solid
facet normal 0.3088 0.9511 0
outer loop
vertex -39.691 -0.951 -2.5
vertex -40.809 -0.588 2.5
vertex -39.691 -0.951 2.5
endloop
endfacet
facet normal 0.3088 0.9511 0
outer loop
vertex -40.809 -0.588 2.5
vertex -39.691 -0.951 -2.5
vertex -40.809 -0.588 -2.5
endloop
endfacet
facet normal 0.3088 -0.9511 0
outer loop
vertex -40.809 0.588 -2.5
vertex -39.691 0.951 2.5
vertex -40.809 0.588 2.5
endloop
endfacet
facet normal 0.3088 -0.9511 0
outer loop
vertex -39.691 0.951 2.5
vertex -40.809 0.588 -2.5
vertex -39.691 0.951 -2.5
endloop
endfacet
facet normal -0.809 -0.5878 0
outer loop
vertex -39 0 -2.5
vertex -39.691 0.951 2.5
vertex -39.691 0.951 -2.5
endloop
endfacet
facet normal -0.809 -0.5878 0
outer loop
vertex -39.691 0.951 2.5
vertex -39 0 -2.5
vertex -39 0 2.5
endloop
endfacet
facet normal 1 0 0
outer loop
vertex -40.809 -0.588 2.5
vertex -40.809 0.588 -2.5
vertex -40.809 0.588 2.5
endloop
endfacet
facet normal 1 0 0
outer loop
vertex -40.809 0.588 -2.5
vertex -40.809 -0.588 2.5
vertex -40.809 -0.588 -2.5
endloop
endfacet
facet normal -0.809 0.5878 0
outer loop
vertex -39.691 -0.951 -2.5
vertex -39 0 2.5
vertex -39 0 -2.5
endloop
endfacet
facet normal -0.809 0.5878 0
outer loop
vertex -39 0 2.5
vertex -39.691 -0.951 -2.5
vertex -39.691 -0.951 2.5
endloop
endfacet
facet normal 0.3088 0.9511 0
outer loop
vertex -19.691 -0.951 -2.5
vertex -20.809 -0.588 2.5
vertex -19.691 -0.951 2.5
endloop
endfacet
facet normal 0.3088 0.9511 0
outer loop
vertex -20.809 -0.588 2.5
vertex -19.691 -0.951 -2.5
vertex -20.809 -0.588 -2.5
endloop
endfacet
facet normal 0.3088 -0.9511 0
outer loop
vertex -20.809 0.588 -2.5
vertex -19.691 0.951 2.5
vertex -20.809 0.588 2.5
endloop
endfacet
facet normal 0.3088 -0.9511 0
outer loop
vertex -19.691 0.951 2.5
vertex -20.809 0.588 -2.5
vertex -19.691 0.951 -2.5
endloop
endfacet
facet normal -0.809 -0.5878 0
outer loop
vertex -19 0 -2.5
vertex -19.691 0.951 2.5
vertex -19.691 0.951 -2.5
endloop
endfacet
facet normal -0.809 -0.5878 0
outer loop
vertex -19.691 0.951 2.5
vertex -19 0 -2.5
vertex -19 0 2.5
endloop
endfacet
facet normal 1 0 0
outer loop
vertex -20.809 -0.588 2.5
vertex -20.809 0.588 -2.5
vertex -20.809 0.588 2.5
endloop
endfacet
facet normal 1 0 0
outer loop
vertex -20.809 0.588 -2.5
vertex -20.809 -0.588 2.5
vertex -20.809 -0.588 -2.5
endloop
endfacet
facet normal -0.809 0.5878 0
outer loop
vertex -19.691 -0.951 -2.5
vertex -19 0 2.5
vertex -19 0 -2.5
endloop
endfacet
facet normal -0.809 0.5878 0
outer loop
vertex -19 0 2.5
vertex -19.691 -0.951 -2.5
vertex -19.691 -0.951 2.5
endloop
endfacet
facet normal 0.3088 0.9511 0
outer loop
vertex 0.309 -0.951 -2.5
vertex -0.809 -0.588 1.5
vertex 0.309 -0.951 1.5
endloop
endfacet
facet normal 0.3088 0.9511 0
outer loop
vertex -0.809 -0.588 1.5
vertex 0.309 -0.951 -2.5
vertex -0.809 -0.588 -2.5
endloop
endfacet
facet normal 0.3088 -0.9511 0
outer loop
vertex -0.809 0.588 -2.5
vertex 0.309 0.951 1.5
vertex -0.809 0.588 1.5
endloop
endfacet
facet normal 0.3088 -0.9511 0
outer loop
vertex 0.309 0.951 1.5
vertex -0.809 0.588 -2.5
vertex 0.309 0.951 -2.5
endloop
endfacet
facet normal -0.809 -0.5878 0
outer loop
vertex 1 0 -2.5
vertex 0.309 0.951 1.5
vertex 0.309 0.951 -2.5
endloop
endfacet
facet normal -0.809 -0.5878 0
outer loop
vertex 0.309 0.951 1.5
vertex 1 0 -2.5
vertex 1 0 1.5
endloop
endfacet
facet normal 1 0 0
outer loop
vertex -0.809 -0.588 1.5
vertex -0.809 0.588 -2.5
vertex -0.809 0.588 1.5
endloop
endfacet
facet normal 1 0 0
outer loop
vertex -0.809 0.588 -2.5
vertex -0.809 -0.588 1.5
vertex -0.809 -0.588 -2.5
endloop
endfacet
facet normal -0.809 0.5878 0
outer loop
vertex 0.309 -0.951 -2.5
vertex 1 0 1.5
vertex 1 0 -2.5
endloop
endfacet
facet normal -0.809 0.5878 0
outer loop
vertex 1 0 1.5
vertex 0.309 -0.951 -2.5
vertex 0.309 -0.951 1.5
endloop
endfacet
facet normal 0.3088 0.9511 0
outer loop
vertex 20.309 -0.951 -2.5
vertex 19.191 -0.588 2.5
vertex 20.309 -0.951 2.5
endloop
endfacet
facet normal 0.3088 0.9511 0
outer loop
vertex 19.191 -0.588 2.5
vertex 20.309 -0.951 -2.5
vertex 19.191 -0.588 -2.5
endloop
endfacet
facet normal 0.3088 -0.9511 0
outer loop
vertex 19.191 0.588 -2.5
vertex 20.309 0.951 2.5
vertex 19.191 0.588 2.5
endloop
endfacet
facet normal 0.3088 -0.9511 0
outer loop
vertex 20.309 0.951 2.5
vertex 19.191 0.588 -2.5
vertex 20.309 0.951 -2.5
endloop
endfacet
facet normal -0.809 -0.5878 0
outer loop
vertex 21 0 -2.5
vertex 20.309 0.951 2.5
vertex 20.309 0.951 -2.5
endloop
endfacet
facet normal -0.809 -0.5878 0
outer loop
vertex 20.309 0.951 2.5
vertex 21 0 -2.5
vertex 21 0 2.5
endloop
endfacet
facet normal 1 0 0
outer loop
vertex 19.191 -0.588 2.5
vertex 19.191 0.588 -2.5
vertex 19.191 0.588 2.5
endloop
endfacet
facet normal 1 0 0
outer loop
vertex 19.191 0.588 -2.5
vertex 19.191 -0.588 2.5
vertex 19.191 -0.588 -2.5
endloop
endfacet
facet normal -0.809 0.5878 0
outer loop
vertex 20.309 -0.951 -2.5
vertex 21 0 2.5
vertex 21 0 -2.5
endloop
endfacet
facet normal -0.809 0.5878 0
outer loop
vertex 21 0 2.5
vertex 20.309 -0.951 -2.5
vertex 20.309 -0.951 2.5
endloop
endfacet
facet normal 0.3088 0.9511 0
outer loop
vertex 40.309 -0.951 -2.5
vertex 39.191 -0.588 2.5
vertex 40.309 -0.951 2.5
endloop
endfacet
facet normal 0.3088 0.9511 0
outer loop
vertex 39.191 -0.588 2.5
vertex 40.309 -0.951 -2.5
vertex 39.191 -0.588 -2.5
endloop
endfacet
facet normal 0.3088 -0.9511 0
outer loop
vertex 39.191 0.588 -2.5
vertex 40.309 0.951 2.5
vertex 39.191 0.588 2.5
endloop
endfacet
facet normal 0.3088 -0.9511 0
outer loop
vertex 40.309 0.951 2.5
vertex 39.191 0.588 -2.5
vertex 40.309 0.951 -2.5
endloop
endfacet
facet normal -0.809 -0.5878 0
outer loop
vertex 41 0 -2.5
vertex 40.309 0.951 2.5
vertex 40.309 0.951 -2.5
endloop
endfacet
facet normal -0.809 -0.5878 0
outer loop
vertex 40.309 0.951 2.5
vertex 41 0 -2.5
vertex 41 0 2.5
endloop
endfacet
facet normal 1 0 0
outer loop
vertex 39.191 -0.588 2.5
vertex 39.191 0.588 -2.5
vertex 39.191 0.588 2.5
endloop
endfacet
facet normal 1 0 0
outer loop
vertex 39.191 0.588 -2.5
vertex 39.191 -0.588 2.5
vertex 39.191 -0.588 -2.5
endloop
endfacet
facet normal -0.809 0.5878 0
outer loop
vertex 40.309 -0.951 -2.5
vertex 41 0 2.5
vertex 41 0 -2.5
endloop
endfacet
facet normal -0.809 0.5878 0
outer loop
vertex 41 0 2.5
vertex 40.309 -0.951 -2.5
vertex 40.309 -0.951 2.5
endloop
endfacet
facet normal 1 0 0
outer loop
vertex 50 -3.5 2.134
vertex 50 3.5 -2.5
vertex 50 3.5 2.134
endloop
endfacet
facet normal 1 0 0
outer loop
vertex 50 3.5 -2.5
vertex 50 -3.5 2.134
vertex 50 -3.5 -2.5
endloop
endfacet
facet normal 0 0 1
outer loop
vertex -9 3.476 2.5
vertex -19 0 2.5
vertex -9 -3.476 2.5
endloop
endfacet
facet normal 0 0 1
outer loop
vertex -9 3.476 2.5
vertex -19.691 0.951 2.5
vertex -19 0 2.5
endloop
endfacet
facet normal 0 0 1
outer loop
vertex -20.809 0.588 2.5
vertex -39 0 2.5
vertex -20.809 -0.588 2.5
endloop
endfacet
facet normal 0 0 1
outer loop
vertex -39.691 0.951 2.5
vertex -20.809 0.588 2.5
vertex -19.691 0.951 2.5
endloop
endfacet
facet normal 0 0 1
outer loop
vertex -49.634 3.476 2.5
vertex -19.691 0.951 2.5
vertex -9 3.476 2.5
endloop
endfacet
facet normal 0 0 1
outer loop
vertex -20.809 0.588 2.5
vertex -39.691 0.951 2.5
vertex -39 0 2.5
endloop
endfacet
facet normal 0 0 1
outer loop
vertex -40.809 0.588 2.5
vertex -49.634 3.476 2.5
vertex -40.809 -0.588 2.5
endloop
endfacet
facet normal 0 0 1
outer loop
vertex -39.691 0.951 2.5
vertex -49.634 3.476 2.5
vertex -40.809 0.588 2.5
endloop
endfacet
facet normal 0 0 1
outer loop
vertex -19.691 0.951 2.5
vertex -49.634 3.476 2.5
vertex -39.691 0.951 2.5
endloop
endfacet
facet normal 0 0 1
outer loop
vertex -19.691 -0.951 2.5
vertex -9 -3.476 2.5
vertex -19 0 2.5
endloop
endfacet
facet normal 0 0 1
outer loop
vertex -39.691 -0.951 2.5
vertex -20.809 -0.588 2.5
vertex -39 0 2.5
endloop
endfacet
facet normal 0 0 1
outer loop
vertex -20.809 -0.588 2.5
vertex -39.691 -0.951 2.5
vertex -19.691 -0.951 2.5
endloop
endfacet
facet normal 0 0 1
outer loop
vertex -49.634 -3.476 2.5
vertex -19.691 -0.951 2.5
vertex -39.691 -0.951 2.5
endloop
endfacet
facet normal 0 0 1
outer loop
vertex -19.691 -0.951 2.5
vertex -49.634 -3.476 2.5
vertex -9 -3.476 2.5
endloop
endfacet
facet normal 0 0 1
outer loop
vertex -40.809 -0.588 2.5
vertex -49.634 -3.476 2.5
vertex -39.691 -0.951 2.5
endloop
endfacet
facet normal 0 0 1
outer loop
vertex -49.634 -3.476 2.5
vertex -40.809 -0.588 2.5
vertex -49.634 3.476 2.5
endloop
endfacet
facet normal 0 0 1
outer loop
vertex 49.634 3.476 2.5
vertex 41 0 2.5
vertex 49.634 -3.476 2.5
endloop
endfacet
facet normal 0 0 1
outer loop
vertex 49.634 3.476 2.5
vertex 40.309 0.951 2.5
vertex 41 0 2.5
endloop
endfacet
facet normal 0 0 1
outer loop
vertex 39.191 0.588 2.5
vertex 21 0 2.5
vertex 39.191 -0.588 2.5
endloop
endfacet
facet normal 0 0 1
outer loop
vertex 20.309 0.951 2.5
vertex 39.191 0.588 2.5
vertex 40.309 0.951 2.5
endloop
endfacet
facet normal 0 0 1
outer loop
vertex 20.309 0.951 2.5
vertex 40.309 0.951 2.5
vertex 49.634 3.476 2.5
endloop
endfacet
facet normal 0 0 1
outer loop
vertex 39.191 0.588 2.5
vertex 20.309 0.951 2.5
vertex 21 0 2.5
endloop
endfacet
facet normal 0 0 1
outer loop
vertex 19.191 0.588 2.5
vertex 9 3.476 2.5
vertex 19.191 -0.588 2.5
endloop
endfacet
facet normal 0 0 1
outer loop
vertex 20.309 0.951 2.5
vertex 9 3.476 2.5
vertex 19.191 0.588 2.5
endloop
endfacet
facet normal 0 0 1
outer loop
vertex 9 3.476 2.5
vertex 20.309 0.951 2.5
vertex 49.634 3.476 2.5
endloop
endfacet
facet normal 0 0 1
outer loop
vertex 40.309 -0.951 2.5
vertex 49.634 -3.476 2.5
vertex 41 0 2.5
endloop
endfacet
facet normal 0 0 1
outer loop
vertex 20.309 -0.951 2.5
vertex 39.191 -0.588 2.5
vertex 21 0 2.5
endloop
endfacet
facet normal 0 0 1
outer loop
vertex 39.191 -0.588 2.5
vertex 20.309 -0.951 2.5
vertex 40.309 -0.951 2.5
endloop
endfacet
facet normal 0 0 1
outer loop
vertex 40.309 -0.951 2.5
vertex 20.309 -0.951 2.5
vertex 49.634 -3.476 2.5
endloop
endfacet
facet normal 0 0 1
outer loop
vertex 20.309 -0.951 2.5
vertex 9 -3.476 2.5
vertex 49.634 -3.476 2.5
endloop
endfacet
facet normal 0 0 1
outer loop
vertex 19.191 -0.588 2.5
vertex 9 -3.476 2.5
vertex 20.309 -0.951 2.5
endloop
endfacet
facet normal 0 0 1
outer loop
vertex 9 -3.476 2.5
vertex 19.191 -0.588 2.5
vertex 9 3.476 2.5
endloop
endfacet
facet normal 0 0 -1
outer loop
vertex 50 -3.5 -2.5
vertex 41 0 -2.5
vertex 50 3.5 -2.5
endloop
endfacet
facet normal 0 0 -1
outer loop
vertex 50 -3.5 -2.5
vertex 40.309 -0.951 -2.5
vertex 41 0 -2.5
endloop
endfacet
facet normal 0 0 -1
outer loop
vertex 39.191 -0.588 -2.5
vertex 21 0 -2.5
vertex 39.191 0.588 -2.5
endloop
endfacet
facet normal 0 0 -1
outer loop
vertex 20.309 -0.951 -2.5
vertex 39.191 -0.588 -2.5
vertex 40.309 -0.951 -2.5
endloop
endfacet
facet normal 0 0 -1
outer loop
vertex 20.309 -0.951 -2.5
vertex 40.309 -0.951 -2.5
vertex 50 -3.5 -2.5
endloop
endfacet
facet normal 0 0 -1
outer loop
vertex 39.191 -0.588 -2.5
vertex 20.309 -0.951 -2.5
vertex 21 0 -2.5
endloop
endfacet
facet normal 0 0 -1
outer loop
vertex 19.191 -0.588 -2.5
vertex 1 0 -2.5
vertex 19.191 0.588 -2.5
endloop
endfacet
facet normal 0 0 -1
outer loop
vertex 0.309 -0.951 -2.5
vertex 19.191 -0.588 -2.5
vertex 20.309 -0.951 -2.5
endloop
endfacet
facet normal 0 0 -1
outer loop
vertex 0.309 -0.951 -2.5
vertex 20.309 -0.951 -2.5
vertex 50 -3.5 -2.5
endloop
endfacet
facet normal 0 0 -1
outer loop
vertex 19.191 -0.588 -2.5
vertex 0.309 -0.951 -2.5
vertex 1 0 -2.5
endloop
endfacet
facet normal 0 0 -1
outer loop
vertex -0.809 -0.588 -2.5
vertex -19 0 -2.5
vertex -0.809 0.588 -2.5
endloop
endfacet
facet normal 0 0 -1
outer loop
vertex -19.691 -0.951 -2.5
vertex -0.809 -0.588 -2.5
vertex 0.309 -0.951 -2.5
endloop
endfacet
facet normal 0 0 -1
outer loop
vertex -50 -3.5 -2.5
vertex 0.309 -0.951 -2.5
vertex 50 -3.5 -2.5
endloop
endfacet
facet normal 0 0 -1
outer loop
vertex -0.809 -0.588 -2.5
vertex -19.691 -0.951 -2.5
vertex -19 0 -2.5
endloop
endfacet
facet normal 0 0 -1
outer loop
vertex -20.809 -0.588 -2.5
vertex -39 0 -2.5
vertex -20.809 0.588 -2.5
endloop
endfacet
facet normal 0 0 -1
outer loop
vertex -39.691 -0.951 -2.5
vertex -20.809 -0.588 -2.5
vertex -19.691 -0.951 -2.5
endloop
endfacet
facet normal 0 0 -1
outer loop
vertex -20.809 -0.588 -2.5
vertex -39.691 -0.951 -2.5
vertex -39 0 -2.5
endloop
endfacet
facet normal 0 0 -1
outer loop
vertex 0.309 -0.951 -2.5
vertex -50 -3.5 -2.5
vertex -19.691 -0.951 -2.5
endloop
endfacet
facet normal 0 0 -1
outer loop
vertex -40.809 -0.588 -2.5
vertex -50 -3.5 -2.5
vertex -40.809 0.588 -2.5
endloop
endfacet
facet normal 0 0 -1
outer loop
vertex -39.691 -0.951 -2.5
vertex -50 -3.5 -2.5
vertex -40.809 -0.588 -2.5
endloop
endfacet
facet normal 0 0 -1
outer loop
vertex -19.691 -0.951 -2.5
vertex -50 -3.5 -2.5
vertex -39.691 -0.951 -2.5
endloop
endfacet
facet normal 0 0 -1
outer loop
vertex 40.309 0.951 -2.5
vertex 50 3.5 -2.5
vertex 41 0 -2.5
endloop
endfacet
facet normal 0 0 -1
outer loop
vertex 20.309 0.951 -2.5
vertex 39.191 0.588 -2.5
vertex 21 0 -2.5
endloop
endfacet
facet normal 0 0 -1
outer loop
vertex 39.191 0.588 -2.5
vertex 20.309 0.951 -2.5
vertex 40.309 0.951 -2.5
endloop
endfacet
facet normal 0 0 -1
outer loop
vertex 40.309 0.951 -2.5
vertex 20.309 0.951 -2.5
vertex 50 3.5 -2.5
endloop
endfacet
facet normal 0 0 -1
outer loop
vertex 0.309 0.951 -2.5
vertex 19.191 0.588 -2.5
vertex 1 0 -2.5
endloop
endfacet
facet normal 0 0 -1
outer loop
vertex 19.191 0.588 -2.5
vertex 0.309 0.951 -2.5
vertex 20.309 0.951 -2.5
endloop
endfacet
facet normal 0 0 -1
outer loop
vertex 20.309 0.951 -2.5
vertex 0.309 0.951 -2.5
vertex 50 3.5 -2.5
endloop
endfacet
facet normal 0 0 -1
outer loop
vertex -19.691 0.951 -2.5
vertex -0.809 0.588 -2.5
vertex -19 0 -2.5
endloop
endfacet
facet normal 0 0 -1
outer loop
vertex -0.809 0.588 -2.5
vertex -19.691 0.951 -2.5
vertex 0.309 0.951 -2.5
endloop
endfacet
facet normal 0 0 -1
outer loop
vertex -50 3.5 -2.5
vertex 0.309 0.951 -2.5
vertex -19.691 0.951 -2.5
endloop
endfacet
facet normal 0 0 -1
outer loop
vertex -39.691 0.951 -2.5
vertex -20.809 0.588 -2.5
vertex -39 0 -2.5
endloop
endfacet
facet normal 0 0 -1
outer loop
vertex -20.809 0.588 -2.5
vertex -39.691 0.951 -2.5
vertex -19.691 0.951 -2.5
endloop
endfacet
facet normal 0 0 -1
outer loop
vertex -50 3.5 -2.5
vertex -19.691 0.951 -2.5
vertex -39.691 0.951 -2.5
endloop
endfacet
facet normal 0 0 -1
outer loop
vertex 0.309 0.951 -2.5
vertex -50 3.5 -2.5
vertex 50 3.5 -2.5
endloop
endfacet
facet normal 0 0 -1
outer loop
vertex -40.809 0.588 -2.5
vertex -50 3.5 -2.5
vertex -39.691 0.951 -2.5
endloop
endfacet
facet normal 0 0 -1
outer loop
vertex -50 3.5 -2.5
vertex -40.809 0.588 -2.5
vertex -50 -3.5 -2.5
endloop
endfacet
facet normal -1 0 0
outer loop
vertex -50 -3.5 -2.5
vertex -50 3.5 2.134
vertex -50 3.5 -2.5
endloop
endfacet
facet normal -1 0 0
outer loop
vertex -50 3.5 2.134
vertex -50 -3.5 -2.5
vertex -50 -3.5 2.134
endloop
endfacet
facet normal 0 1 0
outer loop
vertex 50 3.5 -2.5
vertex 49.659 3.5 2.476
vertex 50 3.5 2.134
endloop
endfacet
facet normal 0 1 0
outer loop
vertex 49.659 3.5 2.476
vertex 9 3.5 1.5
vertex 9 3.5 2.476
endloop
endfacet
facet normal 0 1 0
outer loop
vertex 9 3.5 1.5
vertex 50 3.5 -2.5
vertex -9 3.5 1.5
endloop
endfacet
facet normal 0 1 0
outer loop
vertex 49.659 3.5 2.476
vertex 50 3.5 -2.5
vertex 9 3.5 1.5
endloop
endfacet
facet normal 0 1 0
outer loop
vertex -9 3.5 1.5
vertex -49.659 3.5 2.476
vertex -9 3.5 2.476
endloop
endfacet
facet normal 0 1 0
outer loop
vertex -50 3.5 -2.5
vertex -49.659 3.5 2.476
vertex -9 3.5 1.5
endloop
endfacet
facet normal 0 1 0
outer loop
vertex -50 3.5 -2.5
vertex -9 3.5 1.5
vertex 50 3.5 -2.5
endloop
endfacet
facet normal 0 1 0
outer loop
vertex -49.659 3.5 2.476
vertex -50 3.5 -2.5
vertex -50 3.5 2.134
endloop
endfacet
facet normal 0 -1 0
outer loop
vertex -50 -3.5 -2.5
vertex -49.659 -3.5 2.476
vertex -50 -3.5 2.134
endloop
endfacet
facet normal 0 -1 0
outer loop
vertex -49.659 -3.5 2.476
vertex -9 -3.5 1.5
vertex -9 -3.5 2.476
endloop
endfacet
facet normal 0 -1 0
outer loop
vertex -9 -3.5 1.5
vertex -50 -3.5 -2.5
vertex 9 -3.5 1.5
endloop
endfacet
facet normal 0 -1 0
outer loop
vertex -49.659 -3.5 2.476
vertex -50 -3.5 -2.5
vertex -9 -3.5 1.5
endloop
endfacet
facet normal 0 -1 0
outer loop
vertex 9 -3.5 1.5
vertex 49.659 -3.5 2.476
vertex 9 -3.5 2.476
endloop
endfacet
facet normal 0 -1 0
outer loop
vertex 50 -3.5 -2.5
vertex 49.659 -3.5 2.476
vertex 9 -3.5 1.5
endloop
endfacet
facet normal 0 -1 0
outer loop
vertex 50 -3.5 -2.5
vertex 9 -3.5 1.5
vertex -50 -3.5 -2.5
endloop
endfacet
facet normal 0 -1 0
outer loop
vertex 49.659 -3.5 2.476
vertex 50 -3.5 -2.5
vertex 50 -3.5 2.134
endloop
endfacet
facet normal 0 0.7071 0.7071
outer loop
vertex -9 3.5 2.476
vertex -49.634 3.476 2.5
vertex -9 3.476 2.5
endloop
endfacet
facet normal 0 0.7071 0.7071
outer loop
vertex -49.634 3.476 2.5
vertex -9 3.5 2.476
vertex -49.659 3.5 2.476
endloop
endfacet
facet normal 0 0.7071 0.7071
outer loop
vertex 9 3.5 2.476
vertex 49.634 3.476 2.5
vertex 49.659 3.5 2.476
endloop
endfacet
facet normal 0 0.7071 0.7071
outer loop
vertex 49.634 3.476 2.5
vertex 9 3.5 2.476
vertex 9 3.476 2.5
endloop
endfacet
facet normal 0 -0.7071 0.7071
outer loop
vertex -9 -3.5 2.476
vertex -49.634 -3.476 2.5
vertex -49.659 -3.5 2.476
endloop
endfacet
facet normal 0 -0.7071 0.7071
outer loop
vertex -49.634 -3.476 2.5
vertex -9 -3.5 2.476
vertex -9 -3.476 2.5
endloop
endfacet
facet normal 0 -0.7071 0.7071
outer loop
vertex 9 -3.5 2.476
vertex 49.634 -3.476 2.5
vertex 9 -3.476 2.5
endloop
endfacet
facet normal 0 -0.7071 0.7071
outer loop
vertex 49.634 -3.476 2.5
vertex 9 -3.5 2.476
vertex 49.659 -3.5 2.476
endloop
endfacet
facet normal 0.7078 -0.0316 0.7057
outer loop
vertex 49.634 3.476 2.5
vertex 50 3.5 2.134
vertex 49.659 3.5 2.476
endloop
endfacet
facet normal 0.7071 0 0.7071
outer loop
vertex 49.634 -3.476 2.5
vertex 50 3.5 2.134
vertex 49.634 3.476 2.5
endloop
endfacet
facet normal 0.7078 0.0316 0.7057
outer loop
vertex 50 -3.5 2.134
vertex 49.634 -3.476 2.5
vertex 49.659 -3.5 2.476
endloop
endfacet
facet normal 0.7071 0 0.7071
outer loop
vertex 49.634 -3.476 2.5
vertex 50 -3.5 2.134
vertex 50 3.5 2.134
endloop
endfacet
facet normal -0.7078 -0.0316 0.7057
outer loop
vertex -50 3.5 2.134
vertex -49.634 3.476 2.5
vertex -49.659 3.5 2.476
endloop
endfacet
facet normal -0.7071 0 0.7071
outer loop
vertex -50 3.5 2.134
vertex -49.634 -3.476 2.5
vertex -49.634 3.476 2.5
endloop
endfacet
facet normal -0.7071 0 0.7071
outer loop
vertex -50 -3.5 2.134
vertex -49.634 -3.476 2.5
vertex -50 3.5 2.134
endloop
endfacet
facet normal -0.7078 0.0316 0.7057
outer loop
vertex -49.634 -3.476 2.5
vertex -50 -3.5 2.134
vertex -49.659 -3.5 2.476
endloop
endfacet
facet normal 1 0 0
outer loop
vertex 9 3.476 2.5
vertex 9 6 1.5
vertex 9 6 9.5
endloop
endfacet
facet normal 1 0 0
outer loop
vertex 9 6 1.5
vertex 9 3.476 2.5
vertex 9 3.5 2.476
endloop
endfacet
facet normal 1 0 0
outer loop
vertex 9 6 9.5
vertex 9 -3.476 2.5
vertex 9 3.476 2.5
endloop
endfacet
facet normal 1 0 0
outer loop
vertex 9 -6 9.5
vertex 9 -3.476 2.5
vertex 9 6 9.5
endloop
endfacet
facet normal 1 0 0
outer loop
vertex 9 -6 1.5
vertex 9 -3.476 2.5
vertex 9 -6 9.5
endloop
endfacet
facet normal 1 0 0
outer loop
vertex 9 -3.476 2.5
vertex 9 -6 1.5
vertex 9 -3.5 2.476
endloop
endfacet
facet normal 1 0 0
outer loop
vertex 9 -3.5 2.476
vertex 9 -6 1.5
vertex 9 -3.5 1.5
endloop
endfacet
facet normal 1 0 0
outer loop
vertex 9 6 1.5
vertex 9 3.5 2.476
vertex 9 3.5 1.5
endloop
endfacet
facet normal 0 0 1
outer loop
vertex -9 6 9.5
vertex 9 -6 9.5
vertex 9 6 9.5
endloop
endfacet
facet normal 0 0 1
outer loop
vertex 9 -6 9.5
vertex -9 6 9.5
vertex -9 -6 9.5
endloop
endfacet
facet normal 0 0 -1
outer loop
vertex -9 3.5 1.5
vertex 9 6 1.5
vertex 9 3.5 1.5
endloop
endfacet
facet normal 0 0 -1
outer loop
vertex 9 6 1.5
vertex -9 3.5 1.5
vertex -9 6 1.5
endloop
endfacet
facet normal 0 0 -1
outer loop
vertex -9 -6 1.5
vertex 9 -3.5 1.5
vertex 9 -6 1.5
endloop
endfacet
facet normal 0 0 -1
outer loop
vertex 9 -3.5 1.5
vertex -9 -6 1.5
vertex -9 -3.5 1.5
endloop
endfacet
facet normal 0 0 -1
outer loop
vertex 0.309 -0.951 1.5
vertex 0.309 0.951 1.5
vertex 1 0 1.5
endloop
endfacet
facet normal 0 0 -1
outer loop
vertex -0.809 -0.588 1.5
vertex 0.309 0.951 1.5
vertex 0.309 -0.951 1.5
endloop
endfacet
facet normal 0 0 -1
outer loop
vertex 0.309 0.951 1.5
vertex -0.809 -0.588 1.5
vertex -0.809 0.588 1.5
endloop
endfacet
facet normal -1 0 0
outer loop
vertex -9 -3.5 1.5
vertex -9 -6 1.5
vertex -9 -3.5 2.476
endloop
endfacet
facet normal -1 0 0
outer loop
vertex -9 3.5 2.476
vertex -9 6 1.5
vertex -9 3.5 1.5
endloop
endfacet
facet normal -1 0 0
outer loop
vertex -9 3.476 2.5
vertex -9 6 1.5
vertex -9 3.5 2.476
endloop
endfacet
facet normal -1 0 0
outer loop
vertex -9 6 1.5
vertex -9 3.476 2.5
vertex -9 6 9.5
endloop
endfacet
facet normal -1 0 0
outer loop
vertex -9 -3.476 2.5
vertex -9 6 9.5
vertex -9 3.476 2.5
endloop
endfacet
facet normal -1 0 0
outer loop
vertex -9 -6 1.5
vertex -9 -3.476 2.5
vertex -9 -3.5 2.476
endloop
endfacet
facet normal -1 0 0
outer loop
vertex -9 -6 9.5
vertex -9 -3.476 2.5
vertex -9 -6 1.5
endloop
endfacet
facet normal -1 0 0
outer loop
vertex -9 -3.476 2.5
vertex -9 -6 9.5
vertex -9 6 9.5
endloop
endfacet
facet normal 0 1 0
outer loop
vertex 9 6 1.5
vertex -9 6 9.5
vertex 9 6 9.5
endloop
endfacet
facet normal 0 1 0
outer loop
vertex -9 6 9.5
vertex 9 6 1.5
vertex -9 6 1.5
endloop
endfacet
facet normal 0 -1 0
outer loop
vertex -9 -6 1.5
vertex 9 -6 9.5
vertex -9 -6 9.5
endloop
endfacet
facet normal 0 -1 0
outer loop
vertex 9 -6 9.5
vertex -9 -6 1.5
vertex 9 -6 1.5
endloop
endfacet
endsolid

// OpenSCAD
// Parameters
rail_L = 100; //[50:200:1]
rail_W = 7; //[3.5:14:0.1]
rail_H = 5; //[2.5:10:0.1]
hole_d = 2; //[1:4:0.1]
hole_pitch = 20; //[10:40:1]
hole_edge_offset = 10; //[5:20:1]
hole_count = 5; //[2:9:1]
overlap = 1; //[0.5:2:0.1]
chamfer_edge = 0.6; //[0.3:1.2:0.1]
chamfer_end = 0.8; //[0.4:1.6:0.1]
carriage_L = 18; //[10:36:1]
carriage_W = 12; //[8:24:1]
carriage_H = 8; //[5:16:1]
carriage_clearance = 0.2; //[0.1:0.6:0.05]

// Rail Body
module rail_body() {
  color("Silver")
  cube([rail_L, rail_W, rail_H], center=true);
}

// Mounting Holes
module mounting_hole(pos) {
  translate(pos)
    cylinder(h=rail_H + 2*overlap, r=hole_d/2, center=true);
}

module mounting_holes_pattern() {
  union() {
    for (i = [0:hole_count-1]) {
      mounting_hole([-rail_L/2 + hole_edge_offset + i*hole_pitch, 0, 0]);
    }
  }
}

// Edge Chamfers
module edge_chamfer_wedge_y_pos() {
  translate([0, rail_W/2 - chamfer_edge/2 + overlap/2, rail_H/2 - chamfer_edge/2 + overlap/2])
    rotate([45, 0, 0])
    cube([rail_L + 2*overlap, chamfer_edge, chamfer_edge], center=true);
}

module edge_chamfer_wedge_y_neg() {
  translate([0, -rail_W/2 + chamfer_edge/2 - overlap/2, rail_H/2 - chamfer_edge/2 + overlap/2])
    rotate([45, 0, 0])
    cube([rail_L + 2*overlap, chamfer_edge, chamfer_edge], center=true);
}

module edge_chamfers() {
  union() {
    edge_chamfer_wedge_y_pos();
    edge_chamfer_wedge_y_neg();
  }
}

// End Chamfers
module end_chamfer_wedge_x_pos() {
  translate([rail_L/2 - chamfer_end/2 + overlap/2, 0, rail_H/2 - chamfer_end/2 + overlap/2])
    rotate([0, 45, 0])
    cube([chamfer_end, rail_W + 2*overlap, chamfer_end], center=true);
}

module end_chamfer_wedge_x_neg() {
  translate([-rail_L/2 + chamfer_end/2 - overlap/2, 0, rail_H/2 - chamfer_end/2 + overlap/2])
    rotate([0, 45, 0])
    cube([chamfer_end, rail_W + 2*overlap, chamfer_end], center=true);
}

module end_chamfers() {
  union() {
    end_chamfer_wedge_x_pos();
    end_chamfer_wedge_x_neg();
  }
}

// Carriage Block Placeholder
module carriage_block_placeholder() {
  color("DimGray")
  translate([0, 0, rail_H/2 + carriage_H/2 - overlap])
    cube([carriage_L, carriage_W, carriage_H], center=true);
}

// Complete Model
module complete_model() {
  difference() {
    difference() {
      difference() {
        rail_body();
        mounting_holes_pattern();
      }
      edge_chamfers();
    }
    end_chamfers();
  }
  carriage_block_placeholder();
}

// Final Output
complete_model();
